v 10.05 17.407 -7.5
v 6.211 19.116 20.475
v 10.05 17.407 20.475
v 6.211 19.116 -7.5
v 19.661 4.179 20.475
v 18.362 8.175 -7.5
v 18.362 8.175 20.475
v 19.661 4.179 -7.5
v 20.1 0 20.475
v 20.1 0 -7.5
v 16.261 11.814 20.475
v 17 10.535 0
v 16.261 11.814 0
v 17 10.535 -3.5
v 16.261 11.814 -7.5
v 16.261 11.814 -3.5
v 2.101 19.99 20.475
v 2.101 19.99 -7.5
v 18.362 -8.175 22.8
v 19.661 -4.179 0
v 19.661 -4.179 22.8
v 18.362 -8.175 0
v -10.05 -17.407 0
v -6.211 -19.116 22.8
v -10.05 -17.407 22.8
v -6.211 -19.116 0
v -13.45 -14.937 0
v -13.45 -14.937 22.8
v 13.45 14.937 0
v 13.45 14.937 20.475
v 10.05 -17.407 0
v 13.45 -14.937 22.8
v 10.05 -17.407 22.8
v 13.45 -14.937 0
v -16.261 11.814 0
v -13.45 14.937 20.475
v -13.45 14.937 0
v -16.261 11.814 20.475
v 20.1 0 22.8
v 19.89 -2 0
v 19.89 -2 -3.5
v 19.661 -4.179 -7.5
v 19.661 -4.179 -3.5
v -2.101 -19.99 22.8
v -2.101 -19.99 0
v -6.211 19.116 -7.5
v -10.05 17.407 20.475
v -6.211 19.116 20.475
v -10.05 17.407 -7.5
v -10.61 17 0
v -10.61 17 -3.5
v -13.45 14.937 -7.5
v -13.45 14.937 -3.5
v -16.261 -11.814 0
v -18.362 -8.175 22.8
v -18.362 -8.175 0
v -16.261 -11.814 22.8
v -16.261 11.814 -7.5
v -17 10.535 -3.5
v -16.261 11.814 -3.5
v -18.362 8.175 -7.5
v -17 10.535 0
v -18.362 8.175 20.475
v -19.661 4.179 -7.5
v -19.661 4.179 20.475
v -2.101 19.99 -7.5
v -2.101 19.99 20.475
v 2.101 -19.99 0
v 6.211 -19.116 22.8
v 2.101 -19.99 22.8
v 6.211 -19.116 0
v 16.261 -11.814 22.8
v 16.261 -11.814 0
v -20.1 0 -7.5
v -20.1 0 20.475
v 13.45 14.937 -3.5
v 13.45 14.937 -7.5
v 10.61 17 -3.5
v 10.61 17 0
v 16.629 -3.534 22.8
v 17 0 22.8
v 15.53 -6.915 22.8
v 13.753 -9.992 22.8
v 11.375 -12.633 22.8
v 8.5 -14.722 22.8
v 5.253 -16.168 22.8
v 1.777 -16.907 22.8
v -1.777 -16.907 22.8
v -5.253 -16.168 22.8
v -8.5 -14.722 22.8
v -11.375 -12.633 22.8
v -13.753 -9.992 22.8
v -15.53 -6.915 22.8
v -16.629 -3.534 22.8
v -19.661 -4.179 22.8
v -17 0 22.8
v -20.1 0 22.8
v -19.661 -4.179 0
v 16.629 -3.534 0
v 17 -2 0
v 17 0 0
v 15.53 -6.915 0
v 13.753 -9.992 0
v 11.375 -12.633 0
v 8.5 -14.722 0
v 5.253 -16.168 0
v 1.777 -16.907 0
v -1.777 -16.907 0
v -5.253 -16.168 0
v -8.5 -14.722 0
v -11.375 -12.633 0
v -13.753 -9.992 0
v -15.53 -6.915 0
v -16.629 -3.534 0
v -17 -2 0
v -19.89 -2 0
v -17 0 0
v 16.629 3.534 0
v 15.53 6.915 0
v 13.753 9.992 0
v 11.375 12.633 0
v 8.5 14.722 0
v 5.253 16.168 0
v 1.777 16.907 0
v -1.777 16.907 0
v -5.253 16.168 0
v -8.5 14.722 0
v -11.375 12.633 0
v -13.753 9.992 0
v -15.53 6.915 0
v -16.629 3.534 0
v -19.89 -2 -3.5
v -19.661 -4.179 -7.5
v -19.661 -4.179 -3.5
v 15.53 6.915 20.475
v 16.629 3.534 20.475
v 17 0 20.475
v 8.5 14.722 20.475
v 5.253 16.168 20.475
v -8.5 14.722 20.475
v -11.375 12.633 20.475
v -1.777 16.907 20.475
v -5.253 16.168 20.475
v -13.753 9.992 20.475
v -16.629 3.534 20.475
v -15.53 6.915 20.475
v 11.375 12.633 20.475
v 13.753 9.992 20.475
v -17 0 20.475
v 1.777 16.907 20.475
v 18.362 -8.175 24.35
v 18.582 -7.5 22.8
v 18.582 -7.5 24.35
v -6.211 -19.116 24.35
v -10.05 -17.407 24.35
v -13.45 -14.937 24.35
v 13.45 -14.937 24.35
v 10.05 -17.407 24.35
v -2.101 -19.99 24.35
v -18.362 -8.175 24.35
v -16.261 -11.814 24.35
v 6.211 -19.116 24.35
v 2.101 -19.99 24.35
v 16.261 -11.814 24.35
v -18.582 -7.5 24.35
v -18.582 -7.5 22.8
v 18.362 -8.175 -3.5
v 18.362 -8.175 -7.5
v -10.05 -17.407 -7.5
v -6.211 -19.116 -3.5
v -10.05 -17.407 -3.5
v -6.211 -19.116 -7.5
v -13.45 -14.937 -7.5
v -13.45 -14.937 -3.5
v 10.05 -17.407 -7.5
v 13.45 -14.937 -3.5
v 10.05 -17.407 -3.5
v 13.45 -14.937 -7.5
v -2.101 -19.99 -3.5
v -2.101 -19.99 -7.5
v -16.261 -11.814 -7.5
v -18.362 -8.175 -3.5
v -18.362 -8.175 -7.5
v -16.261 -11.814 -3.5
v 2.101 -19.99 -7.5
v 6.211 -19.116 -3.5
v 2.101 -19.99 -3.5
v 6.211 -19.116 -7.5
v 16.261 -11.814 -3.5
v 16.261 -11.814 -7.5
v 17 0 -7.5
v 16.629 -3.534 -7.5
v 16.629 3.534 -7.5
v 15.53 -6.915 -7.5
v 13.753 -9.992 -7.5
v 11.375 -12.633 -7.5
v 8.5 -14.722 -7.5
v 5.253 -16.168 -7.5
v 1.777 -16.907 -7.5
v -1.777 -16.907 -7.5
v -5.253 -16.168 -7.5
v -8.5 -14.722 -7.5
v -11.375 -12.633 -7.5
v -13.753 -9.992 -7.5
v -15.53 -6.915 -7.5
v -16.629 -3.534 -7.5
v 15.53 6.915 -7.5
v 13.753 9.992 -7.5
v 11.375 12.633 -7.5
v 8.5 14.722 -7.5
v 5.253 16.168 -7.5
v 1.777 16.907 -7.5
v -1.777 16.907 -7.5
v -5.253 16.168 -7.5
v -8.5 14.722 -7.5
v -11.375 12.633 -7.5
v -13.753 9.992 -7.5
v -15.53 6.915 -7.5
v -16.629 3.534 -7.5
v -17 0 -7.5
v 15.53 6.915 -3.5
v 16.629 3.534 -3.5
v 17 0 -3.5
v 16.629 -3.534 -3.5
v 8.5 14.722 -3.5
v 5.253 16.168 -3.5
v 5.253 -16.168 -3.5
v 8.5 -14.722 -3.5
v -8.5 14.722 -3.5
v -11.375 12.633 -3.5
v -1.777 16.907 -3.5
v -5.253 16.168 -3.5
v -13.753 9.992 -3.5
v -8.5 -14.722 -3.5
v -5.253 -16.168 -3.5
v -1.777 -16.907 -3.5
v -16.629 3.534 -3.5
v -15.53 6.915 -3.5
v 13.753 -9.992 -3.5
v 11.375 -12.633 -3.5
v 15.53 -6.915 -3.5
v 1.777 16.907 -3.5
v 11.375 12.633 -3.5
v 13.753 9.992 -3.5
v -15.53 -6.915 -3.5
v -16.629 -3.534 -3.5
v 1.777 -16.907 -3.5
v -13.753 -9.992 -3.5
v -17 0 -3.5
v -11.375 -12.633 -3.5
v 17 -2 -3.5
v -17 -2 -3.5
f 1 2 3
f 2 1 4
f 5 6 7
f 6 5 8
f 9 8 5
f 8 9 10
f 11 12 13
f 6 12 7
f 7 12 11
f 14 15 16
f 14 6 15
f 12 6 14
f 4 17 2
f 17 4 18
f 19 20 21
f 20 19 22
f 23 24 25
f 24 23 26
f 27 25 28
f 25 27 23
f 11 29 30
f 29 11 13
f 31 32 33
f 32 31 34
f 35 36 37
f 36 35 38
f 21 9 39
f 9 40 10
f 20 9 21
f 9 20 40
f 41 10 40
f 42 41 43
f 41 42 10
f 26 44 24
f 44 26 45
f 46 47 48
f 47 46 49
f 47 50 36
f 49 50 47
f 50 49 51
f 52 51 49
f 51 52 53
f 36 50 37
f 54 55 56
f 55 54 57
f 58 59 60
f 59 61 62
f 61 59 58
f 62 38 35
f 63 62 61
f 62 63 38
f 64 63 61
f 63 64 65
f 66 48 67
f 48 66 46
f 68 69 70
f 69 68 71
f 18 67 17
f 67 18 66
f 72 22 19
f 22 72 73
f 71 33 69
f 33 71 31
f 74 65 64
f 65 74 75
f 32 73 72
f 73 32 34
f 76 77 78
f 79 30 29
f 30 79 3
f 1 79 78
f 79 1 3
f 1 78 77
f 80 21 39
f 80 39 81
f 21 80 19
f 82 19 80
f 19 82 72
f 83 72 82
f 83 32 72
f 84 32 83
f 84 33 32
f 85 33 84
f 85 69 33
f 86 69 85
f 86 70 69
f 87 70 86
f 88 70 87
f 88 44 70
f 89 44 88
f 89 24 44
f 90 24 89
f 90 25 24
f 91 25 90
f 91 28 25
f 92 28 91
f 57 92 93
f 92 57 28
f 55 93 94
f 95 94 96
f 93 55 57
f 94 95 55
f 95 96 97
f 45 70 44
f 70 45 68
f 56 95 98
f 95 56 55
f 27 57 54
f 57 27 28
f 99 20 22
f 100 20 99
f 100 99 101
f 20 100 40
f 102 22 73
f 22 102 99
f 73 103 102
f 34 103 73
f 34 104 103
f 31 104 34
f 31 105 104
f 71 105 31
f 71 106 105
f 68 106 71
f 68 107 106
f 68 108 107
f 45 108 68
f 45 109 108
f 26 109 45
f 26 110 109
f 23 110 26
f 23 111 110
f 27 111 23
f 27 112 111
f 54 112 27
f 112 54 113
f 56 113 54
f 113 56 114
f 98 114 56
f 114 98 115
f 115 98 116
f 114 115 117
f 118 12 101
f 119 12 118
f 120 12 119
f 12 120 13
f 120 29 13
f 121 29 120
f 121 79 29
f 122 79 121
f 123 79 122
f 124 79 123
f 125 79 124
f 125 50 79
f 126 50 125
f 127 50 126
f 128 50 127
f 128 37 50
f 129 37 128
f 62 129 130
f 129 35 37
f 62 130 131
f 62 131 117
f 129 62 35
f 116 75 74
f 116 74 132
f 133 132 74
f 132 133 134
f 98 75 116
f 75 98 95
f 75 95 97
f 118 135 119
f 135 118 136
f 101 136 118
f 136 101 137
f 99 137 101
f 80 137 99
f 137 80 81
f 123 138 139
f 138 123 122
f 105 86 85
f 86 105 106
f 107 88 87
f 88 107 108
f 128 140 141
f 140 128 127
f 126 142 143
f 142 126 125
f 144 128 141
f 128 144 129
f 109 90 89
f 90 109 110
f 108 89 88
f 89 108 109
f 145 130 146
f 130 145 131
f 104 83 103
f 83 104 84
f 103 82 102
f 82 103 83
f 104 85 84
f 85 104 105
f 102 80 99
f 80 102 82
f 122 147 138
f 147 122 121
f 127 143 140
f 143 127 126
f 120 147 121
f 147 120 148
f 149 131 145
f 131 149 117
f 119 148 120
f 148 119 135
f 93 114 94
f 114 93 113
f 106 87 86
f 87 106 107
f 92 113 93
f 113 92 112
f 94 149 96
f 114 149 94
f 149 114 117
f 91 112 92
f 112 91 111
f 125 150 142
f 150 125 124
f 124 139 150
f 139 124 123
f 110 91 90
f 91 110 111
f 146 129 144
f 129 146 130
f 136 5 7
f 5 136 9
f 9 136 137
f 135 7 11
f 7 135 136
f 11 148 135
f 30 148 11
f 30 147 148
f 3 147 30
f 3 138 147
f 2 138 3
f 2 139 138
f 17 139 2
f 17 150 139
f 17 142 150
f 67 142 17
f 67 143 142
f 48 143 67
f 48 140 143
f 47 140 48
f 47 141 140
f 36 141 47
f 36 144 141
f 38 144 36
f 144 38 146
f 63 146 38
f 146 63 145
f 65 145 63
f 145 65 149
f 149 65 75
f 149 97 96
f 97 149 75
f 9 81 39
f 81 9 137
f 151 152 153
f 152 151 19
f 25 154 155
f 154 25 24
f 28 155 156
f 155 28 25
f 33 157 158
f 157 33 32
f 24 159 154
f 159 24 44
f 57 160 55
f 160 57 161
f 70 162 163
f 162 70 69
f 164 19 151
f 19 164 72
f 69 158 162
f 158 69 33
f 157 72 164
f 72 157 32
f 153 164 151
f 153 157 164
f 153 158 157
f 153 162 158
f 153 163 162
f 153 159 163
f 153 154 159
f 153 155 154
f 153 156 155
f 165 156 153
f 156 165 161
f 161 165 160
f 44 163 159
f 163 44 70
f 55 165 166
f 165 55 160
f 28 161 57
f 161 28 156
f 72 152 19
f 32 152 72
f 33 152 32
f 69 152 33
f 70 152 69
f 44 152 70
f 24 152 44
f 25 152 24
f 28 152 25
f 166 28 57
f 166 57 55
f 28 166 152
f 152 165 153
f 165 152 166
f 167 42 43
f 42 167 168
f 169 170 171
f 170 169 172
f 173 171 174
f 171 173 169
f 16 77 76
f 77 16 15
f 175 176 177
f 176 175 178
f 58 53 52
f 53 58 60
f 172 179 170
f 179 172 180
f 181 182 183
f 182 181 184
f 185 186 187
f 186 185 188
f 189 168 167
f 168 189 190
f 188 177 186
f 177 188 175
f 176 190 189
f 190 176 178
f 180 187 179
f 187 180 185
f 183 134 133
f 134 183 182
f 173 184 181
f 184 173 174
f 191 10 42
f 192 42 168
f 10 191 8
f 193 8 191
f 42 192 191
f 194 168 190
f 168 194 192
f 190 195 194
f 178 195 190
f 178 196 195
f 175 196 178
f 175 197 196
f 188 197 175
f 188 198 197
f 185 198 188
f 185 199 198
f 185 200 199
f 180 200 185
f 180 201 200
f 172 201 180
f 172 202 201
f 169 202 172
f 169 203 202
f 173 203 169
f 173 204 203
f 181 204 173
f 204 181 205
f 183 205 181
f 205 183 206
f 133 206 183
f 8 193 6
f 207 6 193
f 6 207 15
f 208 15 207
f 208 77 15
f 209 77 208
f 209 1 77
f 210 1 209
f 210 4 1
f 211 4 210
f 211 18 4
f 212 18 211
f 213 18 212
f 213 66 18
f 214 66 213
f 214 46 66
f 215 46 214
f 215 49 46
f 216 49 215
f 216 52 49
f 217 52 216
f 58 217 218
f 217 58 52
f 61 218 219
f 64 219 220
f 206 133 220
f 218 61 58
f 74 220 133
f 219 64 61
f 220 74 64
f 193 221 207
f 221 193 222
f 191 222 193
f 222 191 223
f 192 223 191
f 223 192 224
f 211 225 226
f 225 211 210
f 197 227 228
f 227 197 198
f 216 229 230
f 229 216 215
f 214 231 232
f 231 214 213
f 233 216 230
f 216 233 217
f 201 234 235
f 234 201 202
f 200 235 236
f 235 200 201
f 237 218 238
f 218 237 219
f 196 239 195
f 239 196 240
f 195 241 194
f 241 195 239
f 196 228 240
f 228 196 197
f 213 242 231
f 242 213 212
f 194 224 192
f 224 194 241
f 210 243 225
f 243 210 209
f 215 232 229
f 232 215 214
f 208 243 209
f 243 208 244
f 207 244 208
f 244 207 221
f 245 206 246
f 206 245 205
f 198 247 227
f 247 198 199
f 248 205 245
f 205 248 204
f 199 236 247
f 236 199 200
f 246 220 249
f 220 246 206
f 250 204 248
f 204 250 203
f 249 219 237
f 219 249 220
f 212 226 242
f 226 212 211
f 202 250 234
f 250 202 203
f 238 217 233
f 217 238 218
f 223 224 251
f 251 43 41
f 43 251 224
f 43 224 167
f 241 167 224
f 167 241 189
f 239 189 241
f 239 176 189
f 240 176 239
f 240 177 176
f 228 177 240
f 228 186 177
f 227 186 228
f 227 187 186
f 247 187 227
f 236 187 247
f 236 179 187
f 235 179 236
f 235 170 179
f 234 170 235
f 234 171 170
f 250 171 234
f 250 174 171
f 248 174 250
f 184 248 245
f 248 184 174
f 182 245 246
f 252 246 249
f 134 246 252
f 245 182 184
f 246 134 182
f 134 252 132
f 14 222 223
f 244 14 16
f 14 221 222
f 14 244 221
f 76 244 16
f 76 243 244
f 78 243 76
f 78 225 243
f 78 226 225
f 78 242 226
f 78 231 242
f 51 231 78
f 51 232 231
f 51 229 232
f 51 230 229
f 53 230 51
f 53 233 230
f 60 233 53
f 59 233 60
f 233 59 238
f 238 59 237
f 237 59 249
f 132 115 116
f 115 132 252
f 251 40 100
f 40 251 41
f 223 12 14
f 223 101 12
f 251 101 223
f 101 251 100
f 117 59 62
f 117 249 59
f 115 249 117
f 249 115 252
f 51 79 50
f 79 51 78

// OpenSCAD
// file: args.scad
// coin
coin_radius = 22 / 2;
coin_thickness = 1.55;
coin_numbers = 5;
coin_height = coin_thickness * coin_numbers;

// case
case_radius = 30 / 2;
case_height = 94/5;
key_thickness = 2.5;

// shovel
shovel_coin_numbers = 5;
shovel_bottom = 2;

// tolerances
coin_tolerance = 1;
case_tolerance = 4;
filer_tolerance = 1;
key_tolerance = 1;

// chember
case_hole_radius = case_radius + case_tolerance / 2;
case_hole_height = case_height + case_tolerance;
chember_radius = case_hole_radius + coin_thickness * 2;

// filer
filer_radius = case_radius + filer_tolerance;
filer_height = case_height;

filer_hole_radius = coin_radius + filer_tolerance;
// main file
include <args.scad>


// main frame
difference(){
    cylinder(h = case_hole_height, r = chember_radius, center = false);
    cylinder(h = case_hole_height, r = case_hole_radius, center = false);
    translate([0, chember_radius, case_hole_height]){
        cube([chember_radius*2, chember_radius*2, coin_thickness*1.5*2], center = true);
    }
}

// flap
translate([0, 0, case_hole_height]){
    intersection(){
        cylinder(h = coin_thickness, r = chember_radius, center = false);
        translate([0, -(15*2)/2, 0]){
            cube([chember_radius*2, 15, coin_thickness*2], center = true);
        }
    }
}

// keyhole
translate([0, 0, -key_thickness*3]){
    difference(){
        cylinder(h = key_thickness*3, r = chember_radius, center = false);
        cylinder(h = key_thickness*3, r = case_hole_radius, center = false);
        translate([0, -(chember_radius + case_tolerance)/2, (key_thickness + case_tolerance)]){
            cube([chember_radius*2, chember_radius, key_thickness*2], center = true);
        }
        translate([0, 0, (key_thickness + case_tolerance)]){
            cube([case_hole_radius*2, case_hole_radius*2, key_thickness*2], center = true);
        }
    }
}
